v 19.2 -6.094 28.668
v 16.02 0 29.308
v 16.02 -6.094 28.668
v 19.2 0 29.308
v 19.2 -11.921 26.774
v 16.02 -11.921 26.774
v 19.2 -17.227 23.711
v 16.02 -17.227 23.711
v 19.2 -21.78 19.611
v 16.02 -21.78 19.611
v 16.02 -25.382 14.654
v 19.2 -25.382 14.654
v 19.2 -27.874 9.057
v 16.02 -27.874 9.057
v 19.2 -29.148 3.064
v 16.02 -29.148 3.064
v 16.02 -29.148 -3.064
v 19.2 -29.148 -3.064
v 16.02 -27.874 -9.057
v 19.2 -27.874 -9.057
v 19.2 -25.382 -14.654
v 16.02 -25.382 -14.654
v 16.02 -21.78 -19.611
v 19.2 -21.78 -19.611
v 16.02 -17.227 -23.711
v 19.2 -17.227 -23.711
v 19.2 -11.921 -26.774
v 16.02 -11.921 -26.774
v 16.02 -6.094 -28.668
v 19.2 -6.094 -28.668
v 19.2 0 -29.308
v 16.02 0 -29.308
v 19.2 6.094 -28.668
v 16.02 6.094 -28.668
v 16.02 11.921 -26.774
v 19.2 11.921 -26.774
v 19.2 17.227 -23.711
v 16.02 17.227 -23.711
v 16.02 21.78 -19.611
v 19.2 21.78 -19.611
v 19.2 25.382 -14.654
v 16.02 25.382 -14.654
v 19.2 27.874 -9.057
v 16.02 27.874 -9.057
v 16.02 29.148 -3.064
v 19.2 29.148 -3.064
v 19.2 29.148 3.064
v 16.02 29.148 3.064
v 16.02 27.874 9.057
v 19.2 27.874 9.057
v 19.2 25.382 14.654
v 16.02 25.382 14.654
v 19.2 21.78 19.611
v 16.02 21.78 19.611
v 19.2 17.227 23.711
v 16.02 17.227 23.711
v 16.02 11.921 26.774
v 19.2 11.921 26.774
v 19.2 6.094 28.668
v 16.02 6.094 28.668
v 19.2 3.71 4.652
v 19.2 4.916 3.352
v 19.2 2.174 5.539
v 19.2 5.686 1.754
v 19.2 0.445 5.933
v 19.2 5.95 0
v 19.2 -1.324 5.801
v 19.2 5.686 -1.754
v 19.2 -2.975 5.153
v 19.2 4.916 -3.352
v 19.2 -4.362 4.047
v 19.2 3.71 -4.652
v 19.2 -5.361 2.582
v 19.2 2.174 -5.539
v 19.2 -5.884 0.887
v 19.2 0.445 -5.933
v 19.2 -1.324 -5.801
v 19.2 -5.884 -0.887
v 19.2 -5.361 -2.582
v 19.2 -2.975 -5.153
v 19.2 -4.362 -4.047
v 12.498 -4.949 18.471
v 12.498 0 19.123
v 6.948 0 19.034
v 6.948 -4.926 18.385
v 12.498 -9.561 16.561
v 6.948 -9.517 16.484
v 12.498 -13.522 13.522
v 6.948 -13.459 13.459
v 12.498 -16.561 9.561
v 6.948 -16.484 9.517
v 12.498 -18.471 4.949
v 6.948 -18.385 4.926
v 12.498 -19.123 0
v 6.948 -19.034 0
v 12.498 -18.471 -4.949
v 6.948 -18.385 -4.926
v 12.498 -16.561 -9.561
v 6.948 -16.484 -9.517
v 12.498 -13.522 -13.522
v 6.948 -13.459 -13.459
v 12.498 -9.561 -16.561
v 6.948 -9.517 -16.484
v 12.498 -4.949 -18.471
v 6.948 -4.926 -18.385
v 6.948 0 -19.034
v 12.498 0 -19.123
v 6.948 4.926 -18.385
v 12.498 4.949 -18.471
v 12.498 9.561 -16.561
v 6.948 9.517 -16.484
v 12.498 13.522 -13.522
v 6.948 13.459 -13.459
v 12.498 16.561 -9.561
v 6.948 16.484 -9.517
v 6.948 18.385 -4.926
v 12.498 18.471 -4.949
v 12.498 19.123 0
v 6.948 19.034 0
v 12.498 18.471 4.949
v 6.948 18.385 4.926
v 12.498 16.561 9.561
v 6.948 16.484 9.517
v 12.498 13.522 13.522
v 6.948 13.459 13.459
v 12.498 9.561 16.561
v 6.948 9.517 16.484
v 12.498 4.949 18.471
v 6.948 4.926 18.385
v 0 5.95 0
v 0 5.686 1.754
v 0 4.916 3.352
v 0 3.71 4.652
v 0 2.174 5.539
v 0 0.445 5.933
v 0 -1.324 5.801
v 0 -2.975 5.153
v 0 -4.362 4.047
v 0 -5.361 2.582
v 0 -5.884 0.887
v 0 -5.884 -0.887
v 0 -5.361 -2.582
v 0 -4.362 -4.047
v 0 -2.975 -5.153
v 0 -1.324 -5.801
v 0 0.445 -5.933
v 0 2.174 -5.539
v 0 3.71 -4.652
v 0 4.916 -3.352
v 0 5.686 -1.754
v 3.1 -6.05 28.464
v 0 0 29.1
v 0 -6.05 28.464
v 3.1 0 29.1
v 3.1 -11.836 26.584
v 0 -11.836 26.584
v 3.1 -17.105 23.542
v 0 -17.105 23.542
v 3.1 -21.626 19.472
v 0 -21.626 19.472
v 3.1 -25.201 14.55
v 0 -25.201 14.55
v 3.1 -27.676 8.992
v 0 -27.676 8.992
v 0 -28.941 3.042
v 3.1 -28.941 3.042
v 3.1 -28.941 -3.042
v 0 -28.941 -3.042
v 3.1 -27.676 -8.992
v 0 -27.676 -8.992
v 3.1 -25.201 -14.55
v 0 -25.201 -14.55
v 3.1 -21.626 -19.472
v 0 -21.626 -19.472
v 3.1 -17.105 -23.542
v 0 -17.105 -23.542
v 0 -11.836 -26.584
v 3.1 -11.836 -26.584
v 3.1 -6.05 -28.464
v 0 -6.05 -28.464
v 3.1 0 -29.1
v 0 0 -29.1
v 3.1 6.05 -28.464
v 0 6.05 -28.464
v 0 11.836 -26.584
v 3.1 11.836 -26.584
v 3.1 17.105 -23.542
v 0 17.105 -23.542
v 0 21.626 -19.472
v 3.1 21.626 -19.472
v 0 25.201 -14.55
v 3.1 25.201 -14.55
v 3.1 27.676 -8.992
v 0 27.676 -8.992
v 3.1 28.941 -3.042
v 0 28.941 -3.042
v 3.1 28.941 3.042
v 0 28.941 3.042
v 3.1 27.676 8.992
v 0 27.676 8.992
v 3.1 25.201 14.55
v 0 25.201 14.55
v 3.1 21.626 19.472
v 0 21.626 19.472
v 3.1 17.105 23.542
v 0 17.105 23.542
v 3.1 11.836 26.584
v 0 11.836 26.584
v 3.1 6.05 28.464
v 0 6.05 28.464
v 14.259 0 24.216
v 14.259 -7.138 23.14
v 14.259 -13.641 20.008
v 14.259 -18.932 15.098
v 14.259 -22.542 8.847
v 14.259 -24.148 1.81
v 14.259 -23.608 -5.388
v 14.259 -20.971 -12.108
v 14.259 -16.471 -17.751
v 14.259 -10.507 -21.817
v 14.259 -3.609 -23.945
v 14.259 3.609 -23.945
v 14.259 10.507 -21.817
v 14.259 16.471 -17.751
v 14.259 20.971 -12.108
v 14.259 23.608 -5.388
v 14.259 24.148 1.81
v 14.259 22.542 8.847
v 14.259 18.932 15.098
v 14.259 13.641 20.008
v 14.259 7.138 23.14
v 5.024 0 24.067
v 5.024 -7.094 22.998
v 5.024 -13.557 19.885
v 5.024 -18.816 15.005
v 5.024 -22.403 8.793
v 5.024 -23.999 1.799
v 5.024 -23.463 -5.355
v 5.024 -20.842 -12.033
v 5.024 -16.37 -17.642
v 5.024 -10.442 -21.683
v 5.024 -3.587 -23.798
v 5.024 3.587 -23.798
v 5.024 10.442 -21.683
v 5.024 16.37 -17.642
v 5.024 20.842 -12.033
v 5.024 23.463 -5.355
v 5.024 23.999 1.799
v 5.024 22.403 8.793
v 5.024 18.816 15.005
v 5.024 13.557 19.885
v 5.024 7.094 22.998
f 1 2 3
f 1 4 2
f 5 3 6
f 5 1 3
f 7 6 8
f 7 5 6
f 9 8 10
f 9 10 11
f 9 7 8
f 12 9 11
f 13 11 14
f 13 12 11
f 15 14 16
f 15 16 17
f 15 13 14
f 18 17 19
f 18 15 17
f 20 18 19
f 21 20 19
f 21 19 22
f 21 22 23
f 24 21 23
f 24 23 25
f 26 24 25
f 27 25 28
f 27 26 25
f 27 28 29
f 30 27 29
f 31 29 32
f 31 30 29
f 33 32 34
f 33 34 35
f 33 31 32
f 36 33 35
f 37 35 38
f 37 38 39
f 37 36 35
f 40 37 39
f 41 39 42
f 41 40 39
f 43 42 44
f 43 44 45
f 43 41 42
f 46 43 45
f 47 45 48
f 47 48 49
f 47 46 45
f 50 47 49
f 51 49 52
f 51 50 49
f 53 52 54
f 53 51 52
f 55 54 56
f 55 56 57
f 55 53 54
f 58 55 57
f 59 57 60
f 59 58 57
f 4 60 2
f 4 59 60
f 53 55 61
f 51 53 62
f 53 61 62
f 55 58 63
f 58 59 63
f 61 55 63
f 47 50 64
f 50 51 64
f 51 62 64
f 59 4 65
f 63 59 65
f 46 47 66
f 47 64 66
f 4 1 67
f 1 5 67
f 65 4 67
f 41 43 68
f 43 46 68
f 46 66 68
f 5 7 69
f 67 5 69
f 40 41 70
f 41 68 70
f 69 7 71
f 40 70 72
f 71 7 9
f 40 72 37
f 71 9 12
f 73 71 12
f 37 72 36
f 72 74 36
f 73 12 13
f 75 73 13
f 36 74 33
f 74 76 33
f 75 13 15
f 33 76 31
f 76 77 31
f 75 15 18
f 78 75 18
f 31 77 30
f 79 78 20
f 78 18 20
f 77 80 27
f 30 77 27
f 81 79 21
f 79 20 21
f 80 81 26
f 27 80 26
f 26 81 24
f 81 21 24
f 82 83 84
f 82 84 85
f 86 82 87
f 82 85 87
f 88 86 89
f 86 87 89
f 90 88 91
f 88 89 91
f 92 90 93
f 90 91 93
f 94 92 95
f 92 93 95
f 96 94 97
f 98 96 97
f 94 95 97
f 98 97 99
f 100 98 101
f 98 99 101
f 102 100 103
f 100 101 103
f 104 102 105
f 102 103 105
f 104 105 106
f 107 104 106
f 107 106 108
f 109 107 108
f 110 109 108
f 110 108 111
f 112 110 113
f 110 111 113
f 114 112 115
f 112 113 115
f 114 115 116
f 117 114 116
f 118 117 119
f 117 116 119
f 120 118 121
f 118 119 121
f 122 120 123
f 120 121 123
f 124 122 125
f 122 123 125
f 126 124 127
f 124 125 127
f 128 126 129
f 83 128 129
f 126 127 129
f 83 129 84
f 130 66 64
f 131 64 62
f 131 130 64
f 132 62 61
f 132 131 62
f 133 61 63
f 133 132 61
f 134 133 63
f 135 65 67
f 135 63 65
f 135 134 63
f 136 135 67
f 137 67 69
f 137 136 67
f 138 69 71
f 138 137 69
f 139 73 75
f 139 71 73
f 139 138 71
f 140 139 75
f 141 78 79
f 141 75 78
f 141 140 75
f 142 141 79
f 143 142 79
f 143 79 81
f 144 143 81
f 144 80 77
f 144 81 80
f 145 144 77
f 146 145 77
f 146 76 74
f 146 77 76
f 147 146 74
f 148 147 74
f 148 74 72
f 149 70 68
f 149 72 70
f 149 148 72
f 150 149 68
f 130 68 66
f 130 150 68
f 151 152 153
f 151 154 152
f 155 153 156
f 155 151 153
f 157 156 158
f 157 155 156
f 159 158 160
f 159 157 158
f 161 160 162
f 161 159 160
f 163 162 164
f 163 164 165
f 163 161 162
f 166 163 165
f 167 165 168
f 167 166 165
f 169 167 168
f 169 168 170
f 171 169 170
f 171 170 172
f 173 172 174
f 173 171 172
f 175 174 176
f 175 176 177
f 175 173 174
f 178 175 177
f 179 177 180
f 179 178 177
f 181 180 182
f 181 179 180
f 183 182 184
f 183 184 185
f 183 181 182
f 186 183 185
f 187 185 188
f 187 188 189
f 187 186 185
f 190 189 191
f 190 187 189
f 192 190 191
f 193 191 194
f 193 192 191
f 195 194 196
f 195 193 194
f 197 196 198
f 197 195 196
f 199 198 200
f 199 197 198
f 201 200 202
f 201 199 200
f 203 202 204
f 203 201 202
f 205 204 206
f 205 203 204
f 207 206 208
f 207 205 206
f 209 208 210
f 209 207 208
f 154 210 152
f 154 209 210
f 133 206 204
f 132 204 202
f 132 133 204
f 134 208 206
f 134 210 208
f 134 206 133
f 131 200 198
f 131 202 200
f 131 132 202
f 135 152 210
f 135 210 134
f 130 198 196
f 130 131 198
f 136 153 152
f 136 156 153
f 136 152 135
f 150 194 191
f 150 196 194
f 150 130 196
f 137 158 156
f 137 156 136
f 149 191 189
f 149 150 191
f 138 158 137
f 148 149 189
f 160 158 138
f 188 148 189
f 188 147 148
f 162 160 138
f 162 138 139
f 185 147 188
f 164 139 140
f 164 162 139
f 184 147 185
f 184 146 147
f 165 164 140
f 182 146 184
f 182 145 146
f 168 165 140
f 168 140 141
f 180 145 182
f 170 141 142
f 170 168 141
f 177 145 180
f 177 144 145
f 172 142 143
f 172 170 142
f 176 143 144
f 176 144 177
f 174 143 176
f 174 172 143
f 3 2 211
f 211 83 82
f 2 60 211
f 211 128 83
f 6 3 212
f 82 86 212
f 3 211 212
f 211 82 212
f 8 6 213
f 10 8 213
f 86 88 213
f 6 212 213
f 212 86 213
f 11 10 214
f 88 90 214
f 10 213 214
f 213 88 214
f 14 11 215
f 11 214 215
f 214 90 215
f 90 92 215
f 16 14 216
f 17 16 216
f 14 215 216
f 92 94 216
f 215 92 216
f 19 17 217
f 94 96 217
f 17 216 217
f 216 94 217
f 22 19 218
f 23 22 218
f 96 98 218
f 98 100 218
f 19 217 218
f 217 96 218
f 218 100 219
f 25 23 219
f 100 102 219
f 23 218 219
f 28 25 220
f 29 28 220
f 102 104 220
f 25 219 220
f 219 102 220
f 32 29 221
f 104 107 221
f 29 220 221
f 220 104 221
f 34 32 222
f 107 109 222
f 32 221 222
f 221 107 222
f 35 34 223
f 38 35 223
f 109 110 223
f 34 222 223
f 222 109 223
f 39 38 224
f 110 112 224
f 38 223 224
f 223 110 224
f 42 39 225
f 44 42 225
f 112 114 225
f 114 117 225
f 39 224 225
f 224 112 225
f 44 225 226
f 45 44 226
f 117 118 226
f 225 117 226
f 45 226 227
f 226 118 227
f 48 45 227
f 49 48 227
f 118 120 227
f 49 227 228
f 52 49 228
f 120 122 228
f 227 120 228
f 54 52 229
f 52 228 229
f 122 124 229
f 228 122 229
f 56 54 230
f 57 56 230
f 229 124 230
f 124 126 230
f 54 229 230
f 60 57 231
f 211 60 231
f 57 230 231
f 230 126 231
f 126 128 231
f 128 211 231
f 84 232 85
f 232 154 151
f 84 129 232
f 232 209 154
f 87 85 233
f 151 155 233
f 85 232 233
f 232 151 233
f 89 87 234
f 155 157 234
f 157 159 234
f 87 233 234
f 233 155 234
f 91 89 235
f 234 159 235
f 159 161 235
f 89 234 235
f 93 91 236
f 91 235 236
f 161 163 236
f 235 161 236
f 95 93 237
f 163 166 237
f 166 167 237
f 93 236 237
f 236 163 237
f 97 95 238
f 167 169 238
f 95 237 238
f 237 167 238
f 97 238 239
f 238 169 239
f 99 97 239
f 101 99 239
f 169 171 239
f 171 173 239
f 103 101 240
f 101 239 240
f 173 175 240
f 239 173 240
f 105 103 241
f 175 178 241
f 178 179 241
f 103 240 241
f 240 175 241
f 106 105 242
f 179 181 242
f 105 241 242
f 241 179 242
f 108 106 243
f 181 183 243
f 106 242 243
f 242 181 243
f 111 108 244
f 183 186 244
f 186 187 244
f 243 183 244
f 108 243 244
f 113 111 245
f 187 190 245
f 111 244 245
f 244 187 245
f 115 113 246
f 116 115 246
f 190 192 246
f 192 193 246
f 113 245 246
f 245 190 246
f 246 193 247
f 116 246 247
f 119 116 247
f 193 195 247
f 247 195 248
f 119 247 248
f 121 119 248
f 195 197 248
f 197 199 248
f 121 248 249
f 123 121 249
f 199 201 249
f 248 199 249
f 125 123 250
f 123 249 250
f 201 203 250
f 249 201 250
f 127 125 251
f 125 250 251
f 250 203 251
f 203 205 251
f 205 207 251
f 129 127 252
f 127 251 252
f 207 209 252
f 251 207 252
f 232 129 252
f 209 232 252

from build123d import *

# Parameters (mm, degrees)
F0_W     = 3.1
F0_H     = 29.1
F0_W_2   = 3.1796320426
F0_H_2   = 29.3082972342
F2_R     = 5.95
F3_DEPTH = 25


with BuildPart() as f1:
    # F0 (on Front) → F1 (revolve)
    with BuildSketch(Plane.XZ):
        with Locations((1.55, 14.55)):
            Rectangle(F0_W, F0_H)
        Polygon((3.1, 29.1), (3.1, 0), (6.9484059341, 0), (6.9484059341, 19.0335457699), align=None)
        Polygon((6.9484059341, 19.0335457699), (6.9484059341, 0), (12.497687584, 0), (12.497687584, 19.122838374), align=None)
        Polygon((12.497687584, 19.122838374), (12.497687584, 0), (16.0203679574, 0), (16.0203679574, 29.3082972342), align=None)
        with Locations((17.6101839787, 14.6541486171)):
            Rectangle(F0_W_2, F0_H_2)
    revolve(axis=Axis((9.6, 0, 0), (1, 0, 0)))

    # F2 (on Right) → F3 (cut)
    with BuildSketch(Plane.YZ):
        Circle(F2_R)
    extrude(amount=F3_DEPTH, mode=Mode.SUBTRACT)


solid = f1.part
